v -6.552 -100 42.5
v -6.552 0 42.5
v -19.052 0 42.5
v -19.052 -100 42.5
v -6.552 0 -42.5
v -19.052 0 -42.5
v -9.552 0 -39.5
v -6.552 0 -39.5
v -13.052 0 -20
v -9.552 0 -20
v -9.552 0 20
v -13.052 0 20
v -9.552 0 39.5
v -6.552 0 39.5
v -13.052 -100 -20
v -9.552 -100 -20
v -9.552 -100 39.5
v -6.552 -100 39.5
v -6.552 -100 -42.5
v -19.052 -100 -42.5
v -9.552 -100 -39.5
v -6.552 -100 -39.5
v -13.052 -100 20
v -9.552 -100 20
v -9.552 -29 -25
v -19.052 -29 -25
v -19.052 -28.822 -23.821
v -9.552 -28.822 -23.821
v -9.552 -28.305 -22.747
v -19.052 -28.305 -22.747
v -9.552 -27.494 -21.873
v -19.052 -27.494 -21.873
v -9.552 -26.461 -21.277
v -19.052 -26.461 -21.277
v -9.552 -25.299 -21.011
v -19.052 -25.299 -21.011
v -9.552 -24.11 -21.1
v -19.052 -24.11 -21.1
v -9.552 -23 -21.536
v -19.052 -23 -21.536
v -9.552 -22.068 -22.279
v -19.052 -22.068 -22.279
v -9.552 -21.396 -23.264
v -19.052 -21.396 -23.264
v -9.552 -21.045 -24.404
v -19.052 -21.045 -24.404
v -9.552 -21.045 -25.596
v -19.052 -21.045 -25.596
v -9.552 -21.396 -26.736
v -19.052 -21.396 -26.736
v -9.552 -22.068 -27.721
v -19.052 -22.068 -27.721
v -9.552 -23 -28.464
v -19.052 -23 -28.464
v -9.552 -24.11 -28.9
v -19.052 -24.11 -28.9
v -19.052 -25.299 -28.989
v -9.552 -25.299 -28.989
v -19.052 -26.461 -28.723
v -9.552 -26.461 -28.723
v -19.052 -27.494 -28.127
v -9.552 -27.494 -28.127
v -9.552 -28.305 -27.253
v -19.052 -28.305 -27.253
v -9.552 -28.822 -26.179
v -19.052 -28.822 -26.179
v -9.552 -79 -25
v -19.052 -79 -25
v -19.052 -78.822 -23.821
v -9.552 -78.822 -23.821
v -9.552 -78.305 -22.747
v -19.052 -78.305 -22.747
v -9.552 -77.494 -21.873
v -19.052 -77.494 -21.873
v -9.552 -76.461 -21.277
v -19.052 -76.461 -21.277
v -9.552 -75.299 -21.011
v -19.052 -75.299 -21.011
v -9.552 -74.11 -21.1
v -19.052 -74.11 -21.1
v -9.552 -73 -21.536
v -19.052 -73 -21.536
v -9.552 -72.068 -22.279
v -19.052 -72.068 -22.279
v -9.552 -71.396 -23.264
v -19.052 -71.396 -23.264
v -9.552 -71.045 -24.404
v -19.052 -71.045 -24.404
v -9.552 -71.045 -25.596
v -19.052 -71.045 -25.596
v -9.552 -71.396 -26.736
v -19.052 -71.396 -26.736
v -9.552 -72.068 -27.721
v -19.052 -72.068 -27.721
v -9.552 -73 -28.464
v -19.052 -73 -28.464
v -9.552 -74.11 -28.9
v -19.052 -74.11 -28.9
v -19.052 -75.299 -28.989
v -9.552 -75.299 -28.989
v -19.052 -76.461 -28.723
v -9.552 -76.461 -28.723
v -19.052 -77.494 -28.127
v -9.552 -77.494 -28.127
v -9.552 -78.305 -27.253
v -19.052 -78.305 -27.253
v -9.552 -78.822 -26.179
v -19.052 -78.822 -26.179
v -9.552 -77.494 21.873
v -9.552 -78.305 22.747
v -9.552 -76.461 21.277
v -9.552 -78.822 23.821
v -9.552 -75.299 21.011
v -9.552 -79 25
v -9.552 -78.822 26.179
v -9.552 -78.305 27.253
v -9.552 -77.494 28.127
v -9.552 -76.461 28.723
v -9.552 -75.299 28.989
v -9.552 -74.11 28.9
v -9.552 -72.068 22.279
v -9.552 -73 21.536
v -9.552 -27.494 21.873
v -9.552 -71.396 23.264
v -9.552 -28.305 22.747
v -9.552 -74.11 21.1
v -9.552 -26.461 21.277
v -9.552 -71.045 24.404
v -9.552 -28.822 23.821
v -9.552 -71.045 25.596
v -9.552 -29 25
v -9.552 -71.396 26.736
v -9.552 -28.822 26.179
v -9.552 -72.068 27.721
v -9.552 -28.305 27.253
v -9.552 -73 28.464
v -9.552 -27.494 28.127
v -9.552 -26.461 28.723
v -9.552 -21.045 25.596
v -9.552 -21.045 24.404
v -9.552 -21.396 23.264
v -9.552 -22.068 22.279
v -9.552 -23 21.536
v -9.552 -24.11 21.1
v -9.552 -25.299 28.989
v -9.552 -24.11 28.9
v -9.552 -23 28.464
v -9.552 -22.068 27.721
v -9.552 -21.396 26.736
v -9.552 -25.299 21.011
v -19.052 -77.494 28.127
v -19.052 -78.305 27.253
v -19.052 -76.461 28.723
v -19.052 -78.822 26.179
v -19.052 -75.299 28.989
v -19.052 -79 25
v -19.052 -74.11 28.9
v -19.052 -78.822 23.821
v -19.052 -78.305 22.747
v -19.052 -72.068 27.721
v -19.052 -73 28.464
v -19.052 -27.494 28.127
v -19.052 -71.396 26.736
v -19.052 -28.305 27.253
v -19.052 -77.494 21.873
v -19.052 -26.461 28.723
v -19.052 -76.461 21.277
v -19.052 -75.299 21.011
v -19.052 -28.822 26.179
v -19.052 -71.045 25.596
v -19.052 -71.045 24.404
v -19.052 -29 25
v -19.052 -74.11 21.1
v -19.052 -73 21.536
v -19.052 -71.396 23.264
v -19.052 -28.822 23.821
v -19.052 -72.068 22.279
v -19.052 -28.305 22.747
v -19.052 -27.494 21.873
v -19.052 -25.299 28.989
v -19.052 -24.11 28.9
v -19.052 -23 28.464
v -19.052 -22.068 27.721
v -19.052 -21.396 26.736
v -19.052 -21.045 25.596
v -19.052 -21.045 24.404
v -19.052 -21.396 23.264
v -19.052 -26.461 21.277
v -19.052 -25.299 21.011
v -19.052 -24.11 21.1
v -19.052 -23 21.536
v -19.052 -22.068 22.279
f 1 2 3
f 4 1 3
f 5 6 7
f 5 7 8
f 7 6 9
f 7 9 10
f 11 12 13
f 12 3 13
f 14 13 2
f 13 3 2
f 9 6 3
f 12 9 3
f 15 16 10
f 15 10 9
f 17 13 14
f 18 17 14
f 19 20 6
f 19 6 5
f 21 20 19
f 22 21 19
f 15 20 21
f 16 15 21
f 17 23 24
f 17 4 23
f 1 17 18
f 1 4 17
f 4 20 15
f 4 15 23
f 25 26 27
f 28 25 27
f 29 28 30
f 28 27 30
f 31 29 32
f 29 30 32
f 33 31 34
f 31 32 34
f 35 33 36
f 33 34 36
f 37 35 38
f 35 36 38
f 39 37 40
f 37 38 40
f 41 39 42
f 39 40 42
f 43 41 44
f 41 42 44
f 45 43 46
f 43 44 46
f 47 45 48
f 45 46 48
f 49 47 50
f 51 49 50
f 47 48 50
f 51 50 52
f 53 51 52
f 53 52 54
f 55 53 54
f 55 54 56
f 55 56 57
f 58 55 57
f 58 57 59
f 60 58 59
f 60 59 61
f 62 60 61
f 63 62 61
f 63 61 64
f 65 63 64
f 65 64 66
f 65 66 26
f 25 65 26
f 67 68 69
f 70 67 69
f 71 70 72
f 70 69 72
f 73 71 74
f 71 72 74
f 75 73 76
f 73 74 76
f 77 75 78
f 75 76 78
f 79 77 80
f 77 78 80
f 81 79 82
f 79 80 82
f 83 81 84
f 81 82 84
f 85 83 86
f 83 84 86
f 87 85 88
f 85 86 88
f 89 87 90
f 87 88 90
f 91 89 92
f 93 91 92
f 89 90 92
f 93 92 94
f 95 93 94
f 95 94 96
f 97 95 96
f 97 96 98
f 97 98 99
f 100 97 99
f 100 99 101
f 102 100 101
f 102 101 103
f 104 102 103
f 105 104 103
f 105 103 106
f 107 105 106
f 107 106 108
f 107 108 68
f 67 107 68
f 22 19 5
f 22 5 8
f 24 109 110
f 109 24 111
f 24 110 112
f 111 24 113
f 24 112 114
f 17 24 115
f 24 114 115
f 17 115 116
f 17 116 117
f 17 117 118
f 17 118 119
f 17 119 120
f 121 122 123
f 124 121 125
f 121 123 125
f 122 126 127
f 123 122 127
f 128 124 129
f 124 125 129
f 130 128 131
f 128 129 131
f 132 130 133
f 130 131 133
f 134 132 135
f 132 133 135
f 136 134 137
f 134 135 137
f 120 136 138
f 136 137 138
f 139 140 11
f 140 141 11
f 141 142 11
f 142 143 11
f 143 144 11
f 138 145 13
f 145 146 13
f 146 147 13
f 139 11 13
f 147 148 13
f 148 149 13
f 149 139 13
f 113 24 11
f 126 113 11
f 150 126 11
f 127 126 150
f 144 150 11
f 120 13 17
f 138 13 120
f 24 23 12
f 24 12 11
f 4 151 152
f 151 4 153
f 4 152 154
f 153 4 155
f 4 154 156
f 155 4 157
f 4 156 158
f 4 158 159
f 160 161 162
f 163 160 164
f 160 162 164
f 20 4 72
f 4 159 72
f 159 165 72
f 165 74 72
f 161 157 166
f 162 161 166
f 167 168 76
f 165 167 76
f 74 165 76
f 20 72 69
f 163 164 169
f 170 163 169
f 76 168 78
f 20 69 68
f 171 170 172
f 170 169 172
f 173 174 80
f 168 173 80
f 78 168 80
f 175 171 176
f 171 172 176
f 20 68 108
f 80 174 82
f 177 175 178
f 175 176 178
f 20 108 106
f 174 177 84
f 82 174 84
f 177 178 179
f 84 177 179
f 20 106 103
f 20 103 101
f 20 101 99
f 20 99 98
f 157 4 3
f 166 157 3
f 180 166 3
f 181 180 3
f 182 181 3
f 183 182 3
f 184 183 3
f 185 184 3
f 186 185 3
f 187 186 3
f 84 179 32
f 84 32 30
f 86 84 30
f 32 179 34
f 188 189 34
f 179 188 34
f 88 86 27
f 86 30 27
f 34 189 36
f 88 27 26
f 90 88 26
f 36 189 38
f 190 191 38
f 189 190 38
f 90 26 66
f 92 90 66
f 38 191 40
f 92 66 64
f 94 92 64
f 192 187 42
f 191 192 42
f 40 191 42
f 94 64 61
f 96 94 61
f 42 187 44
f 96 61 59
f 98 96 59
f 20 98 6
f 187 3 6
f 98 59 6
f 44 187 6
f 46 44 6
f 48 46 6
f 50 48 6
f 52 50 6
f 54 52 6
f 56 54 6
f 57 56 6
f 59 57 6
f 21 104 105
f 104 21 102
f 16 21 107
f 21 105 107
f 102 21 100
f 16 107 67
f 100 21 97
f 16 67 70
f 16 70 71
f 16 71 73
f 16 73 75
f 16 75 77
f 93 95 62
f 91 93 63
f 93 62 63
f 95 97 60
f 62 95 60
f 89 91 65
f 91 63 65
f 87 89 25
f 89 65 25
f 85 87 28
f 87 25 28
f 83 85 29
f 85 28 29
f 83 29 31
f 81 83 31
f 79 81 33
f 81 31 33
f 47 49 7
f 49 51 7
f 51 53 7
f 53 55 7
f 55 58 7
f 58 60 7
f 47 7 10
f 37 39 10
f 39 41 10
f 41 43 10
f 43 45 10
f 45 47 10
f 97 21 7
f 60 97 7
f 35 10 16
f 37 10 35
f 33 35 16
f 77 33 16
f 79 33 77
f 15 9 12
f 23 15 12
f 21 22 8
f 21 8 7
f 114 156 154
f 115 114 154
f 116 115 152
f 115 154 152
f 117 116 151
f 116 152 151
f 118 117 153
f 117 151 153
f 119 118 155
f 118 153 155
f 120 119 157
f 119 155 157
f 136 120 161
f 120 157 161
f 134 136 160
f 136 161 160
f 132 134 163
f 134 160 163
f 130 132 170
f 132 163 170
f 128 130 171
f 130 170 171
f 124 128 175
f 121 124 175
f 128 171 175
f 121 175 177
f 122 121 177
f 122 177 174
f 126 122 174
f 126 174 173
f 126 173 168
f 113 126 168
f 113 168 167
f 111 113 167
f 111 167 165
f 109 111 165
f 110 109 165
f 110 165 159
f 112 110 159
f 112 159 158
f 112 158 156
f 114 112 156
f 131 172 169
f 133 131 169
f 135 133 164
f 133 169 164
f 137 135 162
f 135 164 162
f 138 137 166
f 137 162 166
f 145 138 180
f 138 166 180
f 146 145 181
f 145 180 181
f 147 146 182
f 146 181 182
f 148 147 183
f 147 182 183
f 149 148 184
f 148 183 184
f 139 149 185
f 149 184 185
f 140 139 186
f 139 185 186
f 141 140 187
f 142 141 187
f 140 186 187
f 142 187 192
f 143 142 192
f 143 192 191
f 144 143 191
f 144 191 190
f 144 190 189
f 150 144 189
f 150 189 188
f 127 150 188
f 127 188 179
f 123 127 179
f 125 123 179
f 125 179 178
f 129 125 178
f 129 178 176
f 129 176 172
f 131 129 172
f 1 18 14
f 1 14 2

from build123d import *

# Parameters (mm, degrees)
F1_DEPTH = 100
F2_R     = 4
F3_DEPTH = 25


with BuildPart() as f1:
    # F0 (on Front) → F1 (new body)
    with BuildSketch(Plane.XZ):
        Polygon((-6.551726, 42.5), (-19.051726, 42.5), (-19.051726, 0), (-19.051726, -42.5), (-6.551726, -42.5), (-6.551726, -39.5), (-9.551726, -39.5), (-9.551726, -20), (-13.051726, -20), (-13.051726, 0), (-13.051726, 20), (-9.551726, 20), (-9.551726, 39.5), (-6.551726, 39.5), align=None)
    extrude(amount=F1_DEPTH)

    # F2 (on face) → F3 (cut)
    with BuildSketch(Plane(origin=(-19.051726, 0, 0), x_dir=(0, -1, 0), z_dir=(-1, 0, 0))):
        with Locations((25, 25)):
            Circle(F2_R)
        with Locations((75, 25)):
            Circle(F2_R)
        with Locations((25, -25)):
            Circle(F2_R)
        with Locations((75, -25)):
            Circle(F2_R)
    extrude(amount=-F3_DEPTH, mode=Mode.SUBTRACT)


solid = f1.part
